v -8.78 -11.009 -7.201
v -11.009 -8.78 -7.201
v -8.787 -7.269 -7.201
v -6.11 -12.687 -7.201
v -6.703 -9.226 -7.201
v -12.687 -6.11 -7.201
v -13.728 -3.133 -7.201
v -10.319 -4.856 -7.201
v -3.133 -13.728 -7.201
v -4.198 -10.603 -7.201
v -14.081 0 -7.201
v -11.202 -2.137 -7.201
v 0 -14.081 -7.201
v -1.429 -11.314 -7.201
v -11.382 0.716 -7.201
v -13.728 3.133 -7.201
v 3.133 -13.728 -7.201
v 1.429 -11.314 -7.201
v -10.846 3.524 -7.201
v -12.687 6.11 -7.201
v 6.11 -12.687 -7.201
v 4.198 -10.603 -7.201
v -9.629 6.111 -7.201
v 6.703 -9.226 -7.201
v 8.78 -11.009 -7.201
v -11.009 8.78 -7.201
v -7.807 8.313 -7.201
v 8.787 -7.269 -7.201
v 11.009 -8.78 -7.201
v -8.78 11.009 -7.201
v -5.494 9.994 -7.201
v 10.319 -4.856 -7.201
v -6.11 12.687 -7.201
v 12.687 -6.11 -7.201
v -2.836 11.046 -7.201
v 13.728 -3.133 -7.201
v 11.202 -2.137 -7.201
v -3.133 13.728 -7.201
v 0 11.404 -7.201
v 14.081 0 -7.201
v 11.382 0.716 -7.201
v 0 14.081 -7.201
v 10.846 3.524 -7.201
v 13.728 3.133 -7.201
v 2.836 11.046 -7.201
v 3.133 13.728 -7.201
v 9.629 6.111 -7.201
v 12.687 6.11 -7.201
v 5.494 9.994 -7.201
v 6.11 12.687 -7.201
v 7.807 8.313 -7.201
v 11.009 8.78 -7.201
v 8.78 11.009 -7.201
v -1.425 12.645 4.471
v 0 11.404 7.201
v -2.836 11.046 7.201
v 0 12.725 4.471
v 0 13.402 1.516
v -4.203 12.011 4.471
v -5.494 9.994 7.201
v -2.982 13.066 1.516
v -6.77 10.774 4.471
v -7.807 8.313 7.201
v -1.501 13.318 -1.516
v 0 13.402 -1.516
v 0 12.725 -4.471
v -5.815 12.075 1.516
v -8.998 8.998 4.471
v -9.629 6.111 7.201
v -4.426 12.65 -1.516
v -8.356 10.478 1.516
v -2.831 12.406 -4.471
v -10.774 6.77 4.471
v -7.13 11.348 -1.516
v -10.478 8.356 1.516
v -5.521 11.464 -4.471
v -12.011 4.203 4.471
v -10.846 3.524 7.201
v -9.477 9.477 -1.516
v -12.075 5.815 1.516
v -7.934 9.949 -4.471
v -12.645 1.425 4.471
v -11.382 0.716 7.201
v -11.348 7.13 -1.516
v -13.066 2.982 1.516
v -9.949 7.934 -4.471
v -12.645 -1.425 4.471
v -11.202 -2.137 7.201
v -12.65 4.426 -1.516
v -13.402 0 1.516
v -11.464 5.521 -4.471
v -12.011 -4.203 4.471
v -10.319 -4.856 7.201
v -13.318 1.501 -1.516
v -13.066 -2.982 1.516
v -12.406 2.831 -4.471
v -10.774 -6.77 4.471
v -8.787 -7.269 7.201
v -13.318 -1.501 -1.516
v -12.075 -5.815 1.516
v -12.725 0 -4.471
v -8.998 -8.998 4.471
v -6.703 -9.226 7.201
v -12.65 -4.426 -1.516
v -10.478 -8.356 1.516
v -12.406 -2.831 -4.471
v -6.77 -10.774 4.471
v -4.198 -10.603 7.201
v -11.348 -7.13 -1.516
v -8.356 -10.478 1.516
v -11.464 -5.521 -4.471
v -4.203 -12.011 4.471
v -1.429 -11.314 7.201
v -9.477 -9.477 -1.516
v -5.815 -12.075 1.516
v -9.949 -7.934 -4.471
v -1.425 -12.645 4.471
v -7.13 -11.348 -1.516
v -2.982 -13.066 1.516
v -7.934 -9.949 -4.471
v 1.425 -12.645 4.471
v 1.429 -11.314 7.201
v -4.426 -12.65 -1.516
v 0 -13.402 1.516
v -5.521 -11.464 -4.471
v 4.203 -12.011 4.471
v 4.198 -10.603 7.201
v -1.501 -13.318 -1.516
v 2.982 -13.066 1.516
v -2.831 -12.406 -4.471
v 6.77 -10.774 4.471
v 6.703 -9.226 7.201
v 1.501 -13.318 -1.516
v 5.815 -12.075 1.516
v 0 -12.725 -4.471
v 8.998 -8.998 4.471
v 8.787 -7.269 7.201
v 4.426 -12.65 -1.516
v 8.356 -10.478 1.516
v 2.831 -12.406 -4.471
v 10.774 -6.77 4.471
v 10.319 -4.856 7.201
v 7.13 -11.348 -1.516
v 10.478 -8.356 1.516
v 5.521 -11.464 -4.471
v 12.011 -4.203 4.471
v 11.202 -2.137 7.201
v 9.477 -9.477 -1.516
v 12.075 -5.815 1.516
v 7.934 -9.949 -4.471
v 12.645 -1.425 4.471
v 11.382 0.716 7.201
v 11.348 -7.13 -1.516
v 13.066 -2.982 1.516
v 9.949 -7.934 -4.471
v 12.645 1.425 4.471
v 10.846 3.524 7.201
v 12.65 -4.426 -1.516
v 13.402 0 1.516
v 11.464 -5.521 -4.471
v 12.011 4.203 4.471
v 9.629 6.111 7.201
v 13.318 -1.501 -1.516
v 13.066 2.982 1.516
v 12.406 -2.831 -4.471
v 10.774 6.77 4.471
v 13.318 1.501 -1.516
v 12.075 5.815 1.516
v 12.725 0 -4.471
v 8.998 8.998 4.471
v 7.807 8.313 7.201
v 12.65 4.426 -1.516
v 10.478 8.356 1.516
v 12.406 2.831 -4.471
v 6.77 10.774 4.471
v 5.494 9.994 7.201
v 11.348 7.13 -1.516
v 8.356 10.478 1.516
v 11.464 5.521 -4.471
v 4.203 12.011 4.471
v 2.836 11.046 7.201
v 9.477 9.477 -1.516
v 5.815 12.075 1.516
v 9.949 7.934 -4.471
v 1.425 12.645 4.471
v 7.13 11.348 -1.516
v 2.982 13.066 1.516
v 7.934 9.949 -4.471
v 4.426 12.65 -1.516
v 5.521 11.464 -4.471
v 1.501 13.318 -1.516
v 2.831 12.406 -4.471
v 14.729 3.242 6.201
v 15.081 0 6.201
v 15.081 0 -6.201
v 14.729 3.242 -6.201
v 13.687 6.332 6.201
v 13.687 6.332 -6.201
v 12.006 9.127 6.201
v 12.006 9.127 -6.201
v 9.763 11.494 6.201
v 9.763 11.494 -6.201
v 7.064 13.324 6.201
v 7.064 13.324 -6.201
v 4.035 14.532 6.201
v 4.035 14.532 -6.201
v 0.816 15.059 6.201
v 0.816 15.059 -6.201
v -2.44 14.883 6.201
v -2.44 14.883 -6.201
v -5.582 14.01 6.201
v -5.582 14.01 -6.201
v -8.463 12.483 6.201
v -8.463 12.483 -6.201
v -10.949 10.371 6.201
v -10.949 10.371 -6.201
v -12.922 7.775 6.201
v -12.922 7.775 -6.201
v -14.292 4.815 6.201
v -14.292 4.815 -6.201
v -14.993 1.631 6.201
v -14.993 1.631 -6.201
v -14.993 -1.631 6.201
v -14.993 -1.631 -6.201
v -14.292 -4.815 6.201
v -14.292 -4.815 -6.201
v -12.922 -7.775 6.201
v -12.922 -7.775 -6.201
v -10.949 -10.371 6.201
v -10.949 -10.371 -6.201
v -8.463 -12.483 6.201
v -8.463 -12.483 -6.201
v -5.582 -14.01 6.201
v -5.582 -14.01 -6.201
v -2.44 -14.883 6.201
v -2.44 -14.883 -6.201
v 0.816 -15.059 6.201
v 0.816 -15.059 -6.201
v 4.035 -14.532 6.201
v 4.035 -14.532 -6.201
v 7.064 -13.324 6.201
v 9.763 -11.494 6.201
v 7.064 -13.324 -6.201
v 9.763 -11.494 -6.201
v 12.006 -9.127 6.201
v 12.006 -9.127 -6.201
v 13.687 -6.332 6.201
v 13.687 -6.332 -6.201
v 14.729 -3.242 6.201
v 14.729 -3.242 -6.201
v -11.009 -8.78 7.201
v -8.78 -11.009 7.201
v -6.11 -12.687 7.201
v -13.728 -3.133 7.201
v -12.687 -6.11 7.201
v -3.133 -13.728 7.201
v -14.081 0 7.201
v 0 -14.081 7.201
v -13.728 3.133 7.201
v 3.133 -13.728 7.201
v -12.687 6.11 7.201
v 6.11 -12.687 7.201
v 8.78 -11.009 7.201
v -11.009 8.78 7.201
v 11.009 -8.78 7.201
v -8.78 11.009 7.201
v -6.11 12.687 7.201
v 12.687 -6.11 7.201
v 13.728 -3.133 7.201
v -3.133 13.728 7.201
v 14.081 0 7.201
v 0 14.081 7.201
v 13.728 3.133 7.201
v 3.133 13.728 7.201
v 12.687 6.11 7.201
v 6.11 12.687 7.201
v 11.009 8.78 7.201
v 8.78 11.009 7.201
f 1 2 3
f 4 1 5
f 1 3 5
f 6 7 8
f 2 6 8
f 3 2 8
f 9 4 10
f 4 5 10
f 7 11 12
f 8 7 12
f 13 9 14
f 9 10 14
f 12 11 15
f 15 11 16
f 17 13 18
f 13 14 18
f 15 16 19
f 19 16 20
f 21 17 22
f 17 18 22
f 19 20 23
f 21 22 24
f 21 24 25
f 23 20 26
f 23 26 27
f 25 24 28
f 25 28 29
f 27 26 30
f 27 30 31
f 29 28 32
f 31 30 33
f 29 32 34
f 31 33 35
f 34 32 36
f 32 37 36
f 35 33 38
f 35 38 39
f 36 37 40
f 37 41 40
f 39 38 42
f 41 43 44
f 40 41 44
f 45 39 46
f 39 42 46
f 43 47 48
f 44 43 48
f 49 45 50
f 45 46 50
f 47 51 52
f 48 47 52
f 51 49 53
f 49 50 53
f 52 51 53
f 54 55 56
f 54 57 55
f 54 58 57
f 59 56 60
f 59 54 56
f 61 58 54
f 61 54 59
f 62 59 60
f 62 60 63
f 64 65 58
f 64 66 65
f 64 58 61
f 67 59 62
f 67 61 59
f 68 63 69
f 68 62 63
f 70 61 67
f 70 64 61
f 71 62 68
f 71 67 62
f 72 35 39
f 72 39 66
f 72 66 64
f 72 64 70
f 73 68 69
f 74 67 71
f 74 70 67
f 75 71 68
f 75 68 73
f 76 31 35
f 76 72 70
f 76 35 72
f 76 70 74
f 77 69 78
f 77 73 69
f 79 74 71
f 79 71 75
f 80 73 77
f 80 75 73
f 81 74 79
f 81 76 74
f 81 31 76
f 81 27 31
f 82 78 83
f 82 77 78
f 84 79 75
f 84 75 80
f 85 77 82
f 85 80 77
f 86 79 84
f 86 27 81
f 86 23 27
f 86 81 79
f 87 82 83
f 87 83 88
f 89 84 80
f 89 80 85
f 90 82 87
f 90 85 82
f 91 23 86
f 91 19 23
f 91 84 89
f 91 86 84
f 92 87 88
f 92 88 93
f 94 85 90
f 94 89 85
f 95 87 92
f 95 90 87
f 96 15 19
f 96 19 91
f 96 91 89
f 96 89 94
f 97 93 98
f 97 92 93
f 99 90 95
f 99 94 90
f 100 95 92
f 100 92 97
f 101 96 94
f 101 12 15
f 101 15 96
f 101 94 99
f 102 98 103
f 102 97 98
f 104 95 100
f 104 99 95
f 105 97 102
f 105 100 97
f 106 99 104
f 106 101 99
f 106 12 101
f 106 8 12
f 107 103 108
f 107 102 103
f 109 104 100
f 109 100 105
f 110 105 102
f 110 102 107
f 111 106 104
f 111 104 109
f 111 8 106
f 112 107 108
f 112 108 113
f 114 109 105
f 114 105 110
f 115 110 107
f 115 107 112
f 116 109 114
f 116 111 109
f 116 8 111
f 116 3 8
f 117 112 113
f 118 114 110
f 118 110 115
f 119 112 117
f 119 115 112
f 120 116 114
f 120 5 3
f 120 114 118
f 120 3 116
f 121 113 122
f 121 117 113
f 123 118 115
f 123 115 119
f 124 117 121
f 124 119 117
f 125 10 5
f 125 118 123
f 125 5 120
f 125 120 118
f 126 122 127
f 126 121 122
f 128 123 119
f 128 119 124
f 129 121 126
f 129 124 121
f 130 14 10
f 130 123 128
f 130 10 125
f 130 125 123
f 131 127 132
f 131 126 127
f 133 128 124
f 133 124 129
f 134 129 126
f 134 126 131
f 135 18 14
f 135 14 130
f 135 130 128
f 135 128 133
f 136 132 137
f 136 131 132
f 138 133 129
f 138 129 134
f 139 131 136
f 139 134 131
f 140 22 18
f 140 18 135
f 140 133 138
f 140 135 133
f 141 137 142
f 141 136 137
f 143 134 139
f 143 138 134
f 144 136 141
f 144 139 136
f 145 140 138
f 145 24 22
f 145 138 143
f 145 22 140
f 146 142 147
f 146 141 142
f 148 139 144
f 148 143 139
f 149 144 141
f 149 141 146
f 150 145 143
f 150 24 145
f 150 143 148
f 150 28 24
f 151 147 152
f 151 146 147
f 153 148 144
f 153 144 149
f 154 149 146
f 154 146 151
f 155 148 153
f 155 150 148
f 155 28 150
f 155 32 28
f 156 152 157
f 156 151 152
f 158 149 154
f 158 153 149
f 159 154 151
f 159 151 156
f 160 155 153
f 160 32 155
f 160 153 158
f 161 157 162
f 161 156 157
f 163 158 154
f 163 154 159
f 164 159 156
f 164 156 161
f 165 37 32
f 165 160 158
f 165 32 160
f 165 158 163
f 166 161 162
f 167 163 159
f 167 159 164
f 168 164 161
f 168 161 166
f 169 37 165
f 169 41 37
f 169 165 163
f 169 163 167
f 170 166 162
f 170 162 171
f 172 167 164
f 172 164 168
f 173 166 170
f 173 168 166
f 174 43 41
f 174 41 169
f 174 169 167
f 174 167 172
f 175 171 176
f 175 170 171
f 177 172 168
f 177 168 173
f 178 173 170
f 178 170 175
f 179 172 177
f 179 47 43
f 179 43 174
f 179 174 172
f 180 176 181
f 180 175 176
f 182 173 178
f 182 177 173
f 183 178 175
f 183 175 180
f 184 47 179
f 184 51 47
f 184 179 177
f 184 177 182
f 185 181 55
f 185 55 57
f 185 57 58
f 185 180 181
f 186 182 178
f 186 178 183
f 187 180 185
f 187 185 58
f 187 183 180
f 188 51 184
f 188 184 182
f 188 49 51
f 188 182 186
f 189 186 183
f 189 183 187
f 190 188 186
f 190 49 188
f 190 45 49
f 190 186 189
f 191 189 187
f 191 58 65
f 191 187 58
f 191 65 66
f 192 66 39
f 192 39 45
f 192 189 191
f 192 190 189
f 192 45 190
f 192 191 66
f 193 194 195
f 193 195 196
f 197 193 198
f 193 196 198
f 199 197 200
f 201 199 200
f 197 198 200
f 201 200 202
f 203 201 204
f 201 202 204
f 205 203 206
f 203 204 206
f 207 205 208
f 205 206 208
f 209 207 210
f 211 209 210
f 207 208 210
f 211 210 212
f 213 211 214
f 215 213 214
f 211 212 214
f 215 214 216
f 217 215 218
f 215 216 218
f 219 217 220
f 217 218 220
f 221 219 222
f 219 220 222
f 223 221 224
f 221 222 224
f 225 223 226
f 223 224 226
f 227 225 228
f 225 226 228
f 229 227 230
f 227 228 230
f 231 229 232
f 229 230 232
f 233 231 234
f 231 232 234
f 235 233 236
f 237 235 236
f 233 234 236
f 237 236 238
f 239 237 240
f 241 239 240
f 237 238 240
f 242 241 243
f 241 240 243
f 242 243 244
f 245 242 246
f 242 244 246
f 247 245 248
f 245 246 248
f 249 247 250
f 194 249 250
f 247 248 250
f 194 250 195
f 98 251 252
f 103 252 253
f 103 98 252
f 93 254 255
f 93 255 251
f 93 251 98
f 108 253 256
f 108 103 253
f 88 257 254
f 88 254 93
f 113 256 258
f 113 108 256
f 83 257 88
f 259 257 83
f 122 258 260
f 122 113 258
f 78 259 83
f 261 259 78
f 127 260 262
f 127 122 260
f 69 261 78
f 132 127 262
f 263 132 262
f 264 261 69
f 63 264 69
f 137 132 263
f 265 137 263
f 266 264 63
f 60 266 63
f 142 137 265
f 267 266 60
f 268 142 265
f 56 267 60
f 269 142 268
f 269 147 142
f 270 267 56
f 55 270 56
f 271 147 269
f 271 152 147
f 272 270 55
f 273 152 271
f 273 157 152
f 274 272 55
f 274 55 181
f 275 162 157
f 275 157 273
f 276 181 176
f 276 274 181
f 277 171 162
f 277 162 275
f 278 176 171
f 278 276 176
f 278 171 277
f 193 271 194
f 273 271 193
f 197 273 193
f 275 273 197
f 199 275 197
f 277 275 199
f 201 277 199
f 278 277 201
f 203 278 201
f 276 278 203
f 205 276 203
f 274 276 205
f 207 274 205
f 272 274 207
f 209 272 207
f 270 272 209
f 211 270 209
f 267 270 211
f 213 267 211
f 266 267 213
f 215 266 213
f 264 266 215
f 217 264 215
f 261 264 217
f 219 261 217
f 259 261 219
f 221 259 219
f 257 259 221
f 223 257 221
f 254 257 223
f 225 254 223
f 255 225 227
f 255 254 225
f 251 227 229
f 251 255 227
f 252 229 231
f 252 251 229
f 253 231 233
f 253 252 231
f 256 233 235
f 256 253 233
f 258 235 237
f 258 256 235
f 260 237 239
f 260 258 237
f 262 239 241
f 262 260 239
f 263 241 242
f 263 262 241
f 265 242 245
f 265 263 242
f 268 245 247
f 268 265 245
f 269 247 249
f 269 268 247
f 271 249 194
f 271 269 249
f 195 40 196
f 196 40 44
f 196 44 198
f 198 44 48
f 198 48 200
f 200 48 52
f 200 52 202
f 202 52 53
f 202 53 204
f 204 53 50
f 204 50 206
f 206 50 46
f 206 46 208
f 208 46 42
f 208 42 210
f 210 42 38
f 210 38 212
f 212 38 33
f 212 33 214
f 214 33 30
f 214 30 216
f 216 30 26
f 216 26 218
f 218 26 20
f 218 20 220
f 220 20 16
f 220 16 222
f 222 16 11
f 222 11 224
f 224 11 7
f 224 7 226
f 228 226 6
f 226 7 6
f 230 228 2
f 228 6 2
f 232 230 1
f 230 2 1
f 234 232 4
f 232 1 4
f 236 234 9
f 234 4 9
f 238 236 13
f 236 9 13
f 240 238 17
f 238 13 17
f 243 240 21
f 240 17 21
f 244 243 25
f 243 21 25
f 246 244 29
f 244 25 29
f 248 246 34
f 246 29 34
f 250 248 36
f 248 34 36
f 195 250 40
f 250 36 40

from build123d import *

# Parameters (mm, degrees)
EXTRUDE1_START = -7.2009
SKETCH1_R      = 15.08125
SKETCH1_R_2    = 7.95
EXTRUDE1_DEPTH = 14.4018
CHAMFER1_SIZE  = 1


with BuildPart() as part:
    # Sketch1 → Extrude1 (new body)
    with BuildSketch(Plane.XY.offset(EXTRUDE1_START)):
        Circle(SKETCH1_R)
        Circle(SKETCH1_R_2, mode=Mode.SUBTRACT)
    extrude(amount=EXTRUDE1_DEPTH)

    # Chamfer1
    chamfer1_edges = [part.edges().sort_by_distance(p)[0] for p in [
        (-15.08125, 0, -7.2009),
        (-15.08125, 0, 7.2009),
    ]]
    chamfer(chamfer1_edges, length=CHAMFER1_SIZE)

    # Sketch2 → Revolve1 (revolve)
    with BuildSketch(Plane(origin=(0, 0, 0), x_dir=(0, 0, -1), z_dir=(1, 0, 0))):
        with BuildLine():
            Line((7.95, 7.94), (-7.95, 7.94))
            Line((-7.95, 7.94), (-7.95, 10.895295258))
            ThreePointArc((-7.95, 10.895295258), (0, 13.4874), (7.95, 10.895295258))
            Line((7.95, 10.895295258), (7.95, 7.94))
        make_face()
    revolve(axis=Axis((0, 0, -11.466432169), (0, 0, 1)))

    # Sketch2_2 → Cut-Revolve1 (revolve, cut)
    with BuildSketch(Plane(origin=(0, 0, 0), x_dir=(0, 0, -1), z_dir=(1, 0, 0))):
        with BuildLine():
            Line((7.95, 7.94), (-7.95, 7.94))
            Line((-7.95, 7.94), (-7.95, 10.895295258))
            ThreePointArc((-7.95, 10.895295258), (0, 13.4874), (7.95, 10.895295258))
            Line((7.95, 10.895295258), (7.95, 7.94))
        make_face()
    revolve(axis=Axis((0, 0, -11.466432169), (0, 0, 1)), mode=Mode.SUBTRACT)


solid = part.part
